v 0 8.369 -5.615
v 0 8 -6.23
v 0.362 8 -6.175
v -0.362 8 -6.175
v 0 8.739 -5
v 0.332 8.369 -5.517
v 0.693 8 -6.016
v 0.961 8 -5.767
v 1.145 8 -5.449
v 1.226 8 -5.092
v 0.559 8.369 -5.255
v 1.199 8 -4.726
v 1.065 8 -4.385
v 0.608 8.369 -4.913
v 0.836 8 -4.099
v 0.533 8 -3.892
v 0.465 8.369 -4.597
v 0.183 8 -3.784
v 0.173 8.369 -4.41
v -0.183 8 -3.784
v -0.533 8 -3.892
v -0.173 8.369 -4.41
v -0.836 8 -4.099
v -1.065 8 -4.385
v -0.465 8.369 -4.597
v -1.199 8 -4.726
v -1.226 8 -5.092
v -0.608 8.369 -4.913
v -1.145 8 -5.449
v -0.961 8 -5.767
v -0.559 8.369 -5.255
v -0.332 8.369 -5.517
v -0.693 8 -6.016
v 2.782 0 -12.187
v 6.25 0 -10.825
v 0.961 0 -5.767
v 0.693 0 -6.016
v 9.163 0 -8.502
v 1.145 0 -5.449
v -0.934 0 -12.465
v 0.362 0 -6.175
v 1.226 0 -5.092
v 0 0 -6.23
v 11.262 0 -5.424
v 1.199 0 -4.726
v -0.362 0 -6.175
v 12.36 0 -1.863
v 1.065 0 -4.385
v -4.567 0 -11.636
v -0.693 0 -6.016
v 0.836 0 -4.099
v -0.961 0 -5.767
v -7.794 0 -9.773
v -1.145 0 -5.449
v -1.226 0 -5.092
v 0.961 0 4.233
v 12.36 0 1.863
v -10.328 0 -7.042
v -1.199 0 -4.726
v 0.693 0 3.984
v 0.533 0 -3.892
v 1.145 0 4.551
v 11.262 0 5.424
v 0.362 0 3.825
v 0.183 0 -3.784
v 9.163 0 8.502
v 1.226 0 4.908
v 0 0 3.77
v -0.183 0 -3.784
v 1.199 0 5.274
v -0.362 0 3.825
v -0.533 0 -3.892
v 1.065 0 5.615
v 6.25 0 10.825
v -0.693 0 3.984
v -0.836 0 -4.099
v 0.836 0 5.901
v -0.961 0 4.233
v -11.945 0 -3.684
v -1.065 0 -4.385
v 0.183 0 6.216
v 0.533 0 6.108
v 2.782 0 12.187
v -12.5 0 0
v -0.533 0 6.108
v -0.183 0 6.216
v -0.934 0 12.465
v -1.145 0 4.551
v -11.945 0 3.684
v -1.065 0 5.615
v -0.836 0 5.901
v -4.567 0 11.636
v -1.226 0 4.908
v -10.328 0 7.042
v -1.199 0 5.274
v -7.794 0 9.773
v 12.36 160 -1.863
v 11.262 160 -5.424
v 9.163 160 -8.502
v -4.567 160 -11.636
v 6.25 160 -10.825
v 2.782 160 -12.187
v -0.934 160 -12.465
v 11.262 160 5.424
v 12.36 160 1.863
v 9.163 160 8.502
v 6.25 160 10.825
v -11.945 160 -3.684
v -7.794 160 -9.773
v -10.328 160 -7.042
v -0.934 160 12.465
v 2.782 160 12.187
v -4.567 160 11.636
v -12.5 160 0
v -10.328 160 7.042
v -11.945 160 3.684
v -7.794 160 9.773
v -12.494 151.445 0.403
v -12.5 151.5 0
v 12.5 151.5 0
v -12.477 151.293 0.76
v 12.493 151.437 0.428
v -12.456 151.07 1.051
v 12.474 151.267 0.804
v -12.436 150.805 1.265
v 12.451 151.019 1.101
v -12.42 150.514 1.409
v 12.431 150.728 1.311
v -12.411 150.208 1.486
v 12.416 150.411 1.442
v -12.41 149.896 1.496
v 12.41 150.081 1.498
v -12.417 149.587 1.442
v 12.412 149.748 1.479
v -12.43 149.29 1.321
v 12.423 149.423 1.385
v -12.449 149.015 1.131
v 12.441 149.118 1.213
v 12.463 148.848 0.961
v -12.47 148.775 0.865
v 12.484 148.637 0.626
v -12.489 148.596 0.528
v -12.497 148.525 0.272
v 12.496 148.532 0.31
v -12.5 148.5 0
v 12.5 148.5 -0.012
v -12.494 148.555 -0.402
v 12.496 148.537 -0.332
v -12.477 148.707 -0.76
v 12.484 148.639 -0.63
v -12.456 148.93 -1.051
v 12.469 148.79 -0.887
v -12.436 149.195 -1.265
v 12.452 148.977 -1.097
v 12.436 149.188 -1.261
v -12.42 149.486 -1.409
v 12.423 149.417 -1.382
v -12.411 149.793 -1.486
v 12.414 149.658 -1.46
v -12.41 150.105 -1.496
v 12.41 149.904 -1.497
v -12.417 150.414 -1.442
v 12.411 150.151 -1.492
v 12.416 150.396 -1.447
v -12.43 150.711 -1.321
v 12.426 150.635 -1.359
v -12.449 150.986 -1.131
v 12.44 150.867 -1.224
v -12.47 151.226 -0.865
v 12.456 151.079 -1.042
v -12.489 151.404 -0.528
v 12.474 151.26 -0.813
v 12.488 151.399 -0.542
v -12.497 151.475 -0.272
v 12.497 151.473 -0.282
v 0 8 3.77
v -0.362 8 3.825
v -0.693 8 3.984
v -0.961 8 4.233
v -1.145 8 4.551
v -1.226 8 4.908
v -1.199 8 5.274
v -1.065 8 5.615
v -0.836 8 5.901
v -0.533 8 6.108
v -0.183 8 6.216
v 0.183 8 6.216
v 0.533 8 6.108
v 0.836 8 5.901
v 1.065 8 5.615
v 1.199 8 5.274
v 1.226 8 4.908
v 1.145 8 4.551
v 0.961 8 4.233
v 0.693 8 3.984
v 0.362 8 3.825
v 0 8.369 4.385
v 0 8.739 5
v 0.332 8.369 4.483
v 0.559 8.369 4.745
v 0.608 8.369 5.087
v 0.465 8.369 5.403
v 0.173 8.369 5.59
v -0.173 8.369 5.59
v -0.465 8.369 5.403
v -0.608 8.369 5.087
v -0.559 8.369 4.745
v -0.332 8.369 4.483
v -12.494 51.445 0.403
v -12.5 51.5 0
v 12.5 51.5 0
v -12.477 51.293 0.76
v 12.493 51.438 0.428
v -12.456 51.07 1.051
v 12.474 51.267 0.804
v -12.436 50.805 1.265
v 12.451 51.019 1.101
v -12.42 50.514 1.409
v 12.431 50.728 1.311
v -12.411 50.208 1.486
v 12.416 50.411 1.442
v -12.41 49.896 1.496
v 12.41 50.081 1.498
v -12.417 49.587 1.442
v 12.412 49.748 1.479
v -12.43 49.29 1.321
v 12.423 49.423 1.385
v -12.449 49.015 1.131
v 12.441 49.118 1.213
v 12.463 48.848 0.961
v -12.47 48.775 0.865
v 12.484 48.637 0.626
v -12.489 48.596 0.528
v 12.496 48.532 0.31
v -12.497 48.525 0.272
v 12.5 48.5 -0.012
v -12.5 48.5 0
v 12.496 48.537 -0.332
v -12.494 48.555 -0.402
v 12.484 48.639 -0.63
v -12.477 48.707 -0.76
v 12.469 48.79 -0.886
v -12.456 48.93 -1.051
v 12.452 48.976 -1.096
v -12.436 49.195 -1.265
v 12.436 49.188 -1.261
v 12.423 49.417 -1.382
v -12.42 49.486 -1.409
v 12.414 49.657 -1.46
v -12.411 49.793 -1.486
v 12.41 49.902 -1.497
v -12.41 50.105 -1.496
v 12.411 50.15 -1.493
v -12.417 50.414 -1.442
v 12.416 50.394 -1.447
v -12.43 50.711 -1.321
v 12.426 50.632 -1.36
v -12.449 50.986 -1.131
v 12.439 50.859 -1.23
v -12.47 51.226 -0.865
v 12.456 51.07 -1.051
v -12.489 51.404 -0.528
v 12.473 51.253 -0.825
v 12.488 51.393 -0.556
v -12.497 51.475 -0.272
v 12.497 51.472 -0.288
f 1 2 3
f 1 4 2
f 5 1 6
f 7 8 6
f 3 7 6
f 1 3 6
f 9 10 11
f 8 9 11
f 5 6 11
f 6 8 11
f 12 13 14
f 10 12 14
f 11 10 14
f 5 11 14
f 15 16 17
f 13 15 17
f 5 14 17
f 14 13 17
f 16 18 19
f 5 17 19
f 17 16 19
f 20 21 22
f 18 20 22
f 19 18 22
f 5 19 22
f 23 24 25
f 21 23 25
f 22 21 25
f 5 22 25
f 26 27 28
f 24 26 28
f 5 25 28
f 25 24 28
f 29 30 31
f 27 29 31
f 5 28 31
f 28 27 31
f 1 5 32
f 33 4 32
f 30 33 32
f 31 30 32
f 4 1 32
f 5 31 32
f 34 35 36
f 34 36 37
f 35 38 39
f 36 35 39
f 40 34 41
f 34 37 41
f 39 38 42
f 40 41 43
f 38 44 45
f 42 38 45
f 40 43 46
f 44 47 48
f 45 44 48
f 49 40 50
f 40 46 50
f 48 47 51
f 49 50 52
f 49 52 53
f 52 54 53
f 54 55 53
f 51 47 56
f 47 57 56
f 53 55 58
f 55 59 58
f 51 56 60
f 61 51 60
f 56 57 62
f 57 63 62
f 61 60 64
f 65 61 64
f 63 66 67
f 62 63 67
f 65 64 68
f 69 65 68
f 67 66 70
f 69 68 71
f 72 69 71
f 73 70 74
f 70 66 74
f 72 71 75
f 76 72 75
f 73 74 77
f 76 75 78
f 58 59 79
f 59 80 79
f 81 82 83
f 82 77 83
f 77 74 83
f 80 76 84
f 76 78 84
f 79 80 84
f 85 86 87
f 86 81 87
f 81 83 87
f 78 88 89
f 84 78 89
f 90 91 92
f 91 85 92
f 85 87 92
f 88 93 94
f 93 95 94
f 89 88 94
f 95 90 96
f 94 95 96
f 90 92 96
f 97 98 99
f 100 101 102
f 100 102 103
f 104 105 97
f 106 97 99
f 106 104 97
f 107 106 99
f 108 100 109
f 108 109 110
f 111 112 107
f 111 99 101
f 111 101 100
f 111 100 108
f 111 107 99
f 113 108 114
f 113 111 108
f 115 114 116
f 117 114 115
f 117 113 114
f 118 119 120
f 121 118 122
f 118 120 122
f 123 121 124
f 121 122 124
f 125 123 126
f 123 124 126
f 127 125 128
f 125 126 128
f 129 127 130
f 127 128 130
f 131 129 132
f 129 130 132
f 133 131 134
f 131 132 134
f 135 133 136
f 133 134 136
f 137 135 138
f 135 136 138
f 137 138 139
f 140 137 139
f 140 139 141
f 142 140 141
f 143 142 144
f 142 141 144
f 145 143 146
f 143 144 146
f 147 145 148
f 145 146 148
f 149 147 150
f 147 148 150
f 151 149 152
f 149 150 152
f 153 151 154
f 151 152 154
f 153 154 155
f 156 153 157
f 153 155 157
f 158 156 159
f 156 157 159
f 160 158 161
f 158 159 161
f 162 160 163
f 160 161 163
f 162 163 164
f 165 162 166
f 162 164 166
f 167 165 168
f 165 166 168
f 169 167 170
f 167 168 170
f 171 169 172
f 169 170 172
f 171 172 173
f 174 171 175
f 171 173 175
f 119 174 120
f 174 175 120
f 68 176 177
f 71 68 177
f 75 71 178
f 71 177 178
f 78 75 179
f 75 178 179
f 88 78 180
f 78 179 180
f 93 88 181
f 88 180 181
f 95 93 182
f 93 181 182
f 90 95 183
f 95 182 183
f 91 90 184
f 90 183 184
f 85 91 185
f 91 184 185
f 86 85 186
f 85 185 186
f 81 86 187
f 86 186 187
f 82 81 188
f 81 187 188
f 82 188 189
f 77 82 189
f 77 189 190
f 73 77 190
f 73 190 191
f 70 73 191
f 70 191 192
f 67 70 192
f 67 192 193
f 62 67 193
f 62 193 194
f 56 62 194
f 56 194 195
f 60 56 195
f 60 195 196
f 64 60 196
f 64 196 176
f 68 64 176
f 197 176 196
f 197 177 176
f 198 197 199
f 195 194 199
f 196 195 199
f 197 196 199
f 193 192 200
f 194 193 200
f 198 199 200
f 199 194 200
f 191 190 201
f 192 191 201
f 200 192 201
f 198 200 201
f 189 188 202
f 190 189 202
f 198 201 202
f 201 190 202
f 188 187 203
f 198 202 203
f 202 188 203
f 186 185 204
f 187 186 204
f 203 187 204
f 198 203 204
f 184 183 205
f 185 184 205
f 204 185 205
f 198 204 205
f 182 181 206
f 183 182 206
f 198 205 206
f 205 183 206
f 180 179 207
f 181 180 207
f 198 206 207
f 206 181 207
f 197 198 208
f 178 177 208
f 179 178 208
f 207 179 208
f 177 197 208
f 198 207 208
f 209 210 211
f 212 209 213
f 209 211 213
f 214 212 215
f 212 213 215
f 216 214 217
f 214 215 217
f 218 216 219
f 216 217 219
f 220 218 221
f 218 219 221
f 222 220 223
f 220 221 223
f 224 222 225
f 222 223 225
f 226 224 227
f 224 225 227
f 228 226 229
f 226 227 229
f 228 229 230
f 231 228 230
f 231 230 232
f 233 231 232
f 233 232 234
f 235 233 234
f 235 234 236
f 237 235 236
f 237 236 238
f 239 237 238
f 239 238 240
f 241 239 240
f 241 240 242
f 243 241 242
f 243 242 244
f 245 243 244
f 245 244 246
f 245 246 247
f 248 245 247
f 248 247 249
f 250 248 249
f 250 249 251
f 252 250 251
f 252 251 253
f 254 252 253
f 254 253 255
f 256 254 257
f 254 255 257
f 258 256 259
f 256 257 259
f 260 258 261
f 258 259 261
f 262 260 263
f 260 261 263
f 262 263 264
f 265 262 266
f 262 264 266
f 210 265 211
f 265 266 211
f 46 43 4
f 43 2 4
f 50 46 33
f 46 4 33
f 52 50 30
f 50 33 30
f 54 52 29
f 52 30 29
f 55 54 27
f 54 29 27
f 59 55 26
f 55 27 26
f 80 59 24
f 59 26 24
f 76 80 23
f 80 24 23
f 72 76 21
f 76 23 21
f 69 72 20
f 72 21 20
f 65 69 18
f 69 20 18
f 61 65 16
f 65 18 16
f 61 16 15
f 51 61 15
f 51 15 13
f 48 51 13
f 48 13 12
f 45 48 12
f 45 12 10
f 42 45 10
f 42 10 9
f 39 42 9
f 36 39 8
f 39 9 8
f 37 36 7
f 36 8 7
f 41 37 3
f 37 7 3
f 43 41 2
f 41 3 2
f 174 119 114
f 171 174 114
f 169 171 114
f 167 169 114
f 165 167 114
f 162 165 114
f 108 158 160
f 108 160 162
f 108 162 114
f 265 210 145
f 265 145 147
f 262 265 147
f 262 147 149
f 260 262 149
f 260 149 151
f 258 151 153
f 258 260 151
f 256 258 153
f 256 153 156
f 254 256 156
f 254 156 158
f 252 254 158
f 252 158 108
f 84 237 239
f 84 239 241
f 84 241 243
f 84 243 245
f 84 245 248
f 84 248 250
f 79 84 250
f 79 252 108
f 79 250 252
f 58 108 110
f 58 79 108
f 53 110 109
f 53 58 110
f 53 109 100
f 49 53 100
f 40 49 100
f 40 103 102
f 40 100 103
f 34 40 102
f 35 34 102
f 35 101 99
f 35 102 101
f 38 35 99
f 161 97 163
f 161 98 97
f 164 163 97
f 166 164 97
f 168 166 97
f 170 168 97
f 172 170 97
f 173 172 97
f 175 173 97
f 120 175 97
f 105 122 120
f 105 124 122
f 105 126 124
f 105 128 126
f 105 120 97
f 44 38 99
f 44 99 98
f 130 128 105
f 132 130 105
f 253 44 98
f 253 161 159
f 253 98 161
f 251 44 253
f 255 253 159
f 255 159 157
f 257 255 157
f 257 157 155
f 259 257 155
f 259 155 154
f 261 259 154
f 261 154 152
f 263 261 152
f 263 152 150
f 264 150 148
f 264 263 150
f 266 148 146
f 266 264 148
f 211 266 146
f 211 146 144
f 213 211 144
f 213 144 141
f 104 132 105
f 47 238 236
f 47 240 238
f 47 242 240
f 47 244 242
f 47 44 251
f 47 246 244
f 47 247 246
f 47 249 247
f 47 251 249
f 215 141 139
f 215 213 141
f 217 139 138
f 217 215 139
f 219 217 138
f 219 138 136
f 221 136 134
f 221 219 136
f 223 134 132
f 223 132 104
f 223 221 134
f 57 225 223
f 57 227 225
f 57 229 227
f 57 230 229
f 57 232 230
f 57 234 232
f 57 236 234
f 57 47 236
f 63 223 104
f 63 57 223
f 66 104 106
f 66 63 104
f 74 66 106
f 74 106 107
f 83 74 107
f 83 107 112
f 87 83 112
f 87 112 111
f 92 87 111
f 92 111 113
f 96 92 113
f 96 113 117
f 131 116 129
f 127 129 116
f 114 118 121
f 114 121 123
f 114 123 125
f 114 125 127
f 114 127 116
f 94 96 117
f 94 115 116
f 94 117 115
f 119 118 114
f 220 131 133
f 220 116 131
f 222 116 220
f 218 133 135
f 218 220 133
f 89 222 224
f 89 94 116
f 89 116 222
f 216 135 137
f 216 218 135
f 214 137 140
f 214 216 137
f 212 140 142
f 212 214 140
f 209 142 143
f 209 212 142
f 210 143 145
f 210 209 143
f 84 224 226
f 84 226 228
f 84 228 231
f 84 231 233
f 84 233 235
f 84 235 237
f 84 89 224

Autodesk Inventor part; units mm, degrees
ref_plane "YZ Plane" through (0, 0, 0) normal (1, 0, 0) x (0, 1, 0)
ref_plane "XZ Plane" through (0, 0, 0) normal (0, 1, 0) x (-1, 0, 0)
ref_plane "XY Plane" through (0, 0, 0) normal (0, 0, 1) x (1, 0, 0)
sketch "Эскиз1" plane through (0, 0, 0) normal (0, 1, 0) x (-1, 0, 0)
  circle A0 centre (0, 0) radius 12.5
  dimension "d0" = 25
extrude "Выдавливание1" add sketch "Эскиз1" along normal blind 160
sketch "Эскиз2" plane through (0, 0, 0) normal (0, -1, 0) x (1, 0, 0)
  circle A0 centre (0, 0) radius 22.5
  line L0 (0, 0) -> (0, 5)
  line L1 (0, 0) -> (0, -5)
  dimension "d3" = 45
  dimension "d4" = 5
  dimension "d5" = 5
hole "Отверстие1" at (0, 0, 5) at (0, 0, -5) direction (0, 1, 0) diameter 2.459 depth 8 tip angle 118 thread size "M3x0.5" class "6H" standard "ISO Metric profile"
sketch "Эскиз4" plane through (0, 0, 0) normal (1, 0, 0) x (0, 1, 0)
  line L0 (160, -12.5) -> (160, 12.5) projected
  line L1 (160, 0) -> (150, 0)
  circle A0 centre (150, 0) radius 1.5
  line L2 (160, 0) -> (150, 0)
  line L3 (150, 0) -> (155, 0)
  circle A1 centre (145, 0) radius 1.5
  line L4 (0, 0) -> (50, 0)
  circle A2 centre (50, 0) radius 1.5
  dimension "d30" = 3
  dimension "d35" = 10
  dimension "d49" = 50
  dimension "d50" = 3
extrude "Выдавливание3" cut sketch "Эскиз4" along normal mid plane 30.75 contours A0 | A2
thread "Резьба4" size "M3x0.5" class "6H" standard "ANSI Metric M Profile" full length
thread "Резьба5" size "M3x0.5" class "6H" standard "ANSI Metric M Profile" full length
properties part number "17701729.303788.008"
